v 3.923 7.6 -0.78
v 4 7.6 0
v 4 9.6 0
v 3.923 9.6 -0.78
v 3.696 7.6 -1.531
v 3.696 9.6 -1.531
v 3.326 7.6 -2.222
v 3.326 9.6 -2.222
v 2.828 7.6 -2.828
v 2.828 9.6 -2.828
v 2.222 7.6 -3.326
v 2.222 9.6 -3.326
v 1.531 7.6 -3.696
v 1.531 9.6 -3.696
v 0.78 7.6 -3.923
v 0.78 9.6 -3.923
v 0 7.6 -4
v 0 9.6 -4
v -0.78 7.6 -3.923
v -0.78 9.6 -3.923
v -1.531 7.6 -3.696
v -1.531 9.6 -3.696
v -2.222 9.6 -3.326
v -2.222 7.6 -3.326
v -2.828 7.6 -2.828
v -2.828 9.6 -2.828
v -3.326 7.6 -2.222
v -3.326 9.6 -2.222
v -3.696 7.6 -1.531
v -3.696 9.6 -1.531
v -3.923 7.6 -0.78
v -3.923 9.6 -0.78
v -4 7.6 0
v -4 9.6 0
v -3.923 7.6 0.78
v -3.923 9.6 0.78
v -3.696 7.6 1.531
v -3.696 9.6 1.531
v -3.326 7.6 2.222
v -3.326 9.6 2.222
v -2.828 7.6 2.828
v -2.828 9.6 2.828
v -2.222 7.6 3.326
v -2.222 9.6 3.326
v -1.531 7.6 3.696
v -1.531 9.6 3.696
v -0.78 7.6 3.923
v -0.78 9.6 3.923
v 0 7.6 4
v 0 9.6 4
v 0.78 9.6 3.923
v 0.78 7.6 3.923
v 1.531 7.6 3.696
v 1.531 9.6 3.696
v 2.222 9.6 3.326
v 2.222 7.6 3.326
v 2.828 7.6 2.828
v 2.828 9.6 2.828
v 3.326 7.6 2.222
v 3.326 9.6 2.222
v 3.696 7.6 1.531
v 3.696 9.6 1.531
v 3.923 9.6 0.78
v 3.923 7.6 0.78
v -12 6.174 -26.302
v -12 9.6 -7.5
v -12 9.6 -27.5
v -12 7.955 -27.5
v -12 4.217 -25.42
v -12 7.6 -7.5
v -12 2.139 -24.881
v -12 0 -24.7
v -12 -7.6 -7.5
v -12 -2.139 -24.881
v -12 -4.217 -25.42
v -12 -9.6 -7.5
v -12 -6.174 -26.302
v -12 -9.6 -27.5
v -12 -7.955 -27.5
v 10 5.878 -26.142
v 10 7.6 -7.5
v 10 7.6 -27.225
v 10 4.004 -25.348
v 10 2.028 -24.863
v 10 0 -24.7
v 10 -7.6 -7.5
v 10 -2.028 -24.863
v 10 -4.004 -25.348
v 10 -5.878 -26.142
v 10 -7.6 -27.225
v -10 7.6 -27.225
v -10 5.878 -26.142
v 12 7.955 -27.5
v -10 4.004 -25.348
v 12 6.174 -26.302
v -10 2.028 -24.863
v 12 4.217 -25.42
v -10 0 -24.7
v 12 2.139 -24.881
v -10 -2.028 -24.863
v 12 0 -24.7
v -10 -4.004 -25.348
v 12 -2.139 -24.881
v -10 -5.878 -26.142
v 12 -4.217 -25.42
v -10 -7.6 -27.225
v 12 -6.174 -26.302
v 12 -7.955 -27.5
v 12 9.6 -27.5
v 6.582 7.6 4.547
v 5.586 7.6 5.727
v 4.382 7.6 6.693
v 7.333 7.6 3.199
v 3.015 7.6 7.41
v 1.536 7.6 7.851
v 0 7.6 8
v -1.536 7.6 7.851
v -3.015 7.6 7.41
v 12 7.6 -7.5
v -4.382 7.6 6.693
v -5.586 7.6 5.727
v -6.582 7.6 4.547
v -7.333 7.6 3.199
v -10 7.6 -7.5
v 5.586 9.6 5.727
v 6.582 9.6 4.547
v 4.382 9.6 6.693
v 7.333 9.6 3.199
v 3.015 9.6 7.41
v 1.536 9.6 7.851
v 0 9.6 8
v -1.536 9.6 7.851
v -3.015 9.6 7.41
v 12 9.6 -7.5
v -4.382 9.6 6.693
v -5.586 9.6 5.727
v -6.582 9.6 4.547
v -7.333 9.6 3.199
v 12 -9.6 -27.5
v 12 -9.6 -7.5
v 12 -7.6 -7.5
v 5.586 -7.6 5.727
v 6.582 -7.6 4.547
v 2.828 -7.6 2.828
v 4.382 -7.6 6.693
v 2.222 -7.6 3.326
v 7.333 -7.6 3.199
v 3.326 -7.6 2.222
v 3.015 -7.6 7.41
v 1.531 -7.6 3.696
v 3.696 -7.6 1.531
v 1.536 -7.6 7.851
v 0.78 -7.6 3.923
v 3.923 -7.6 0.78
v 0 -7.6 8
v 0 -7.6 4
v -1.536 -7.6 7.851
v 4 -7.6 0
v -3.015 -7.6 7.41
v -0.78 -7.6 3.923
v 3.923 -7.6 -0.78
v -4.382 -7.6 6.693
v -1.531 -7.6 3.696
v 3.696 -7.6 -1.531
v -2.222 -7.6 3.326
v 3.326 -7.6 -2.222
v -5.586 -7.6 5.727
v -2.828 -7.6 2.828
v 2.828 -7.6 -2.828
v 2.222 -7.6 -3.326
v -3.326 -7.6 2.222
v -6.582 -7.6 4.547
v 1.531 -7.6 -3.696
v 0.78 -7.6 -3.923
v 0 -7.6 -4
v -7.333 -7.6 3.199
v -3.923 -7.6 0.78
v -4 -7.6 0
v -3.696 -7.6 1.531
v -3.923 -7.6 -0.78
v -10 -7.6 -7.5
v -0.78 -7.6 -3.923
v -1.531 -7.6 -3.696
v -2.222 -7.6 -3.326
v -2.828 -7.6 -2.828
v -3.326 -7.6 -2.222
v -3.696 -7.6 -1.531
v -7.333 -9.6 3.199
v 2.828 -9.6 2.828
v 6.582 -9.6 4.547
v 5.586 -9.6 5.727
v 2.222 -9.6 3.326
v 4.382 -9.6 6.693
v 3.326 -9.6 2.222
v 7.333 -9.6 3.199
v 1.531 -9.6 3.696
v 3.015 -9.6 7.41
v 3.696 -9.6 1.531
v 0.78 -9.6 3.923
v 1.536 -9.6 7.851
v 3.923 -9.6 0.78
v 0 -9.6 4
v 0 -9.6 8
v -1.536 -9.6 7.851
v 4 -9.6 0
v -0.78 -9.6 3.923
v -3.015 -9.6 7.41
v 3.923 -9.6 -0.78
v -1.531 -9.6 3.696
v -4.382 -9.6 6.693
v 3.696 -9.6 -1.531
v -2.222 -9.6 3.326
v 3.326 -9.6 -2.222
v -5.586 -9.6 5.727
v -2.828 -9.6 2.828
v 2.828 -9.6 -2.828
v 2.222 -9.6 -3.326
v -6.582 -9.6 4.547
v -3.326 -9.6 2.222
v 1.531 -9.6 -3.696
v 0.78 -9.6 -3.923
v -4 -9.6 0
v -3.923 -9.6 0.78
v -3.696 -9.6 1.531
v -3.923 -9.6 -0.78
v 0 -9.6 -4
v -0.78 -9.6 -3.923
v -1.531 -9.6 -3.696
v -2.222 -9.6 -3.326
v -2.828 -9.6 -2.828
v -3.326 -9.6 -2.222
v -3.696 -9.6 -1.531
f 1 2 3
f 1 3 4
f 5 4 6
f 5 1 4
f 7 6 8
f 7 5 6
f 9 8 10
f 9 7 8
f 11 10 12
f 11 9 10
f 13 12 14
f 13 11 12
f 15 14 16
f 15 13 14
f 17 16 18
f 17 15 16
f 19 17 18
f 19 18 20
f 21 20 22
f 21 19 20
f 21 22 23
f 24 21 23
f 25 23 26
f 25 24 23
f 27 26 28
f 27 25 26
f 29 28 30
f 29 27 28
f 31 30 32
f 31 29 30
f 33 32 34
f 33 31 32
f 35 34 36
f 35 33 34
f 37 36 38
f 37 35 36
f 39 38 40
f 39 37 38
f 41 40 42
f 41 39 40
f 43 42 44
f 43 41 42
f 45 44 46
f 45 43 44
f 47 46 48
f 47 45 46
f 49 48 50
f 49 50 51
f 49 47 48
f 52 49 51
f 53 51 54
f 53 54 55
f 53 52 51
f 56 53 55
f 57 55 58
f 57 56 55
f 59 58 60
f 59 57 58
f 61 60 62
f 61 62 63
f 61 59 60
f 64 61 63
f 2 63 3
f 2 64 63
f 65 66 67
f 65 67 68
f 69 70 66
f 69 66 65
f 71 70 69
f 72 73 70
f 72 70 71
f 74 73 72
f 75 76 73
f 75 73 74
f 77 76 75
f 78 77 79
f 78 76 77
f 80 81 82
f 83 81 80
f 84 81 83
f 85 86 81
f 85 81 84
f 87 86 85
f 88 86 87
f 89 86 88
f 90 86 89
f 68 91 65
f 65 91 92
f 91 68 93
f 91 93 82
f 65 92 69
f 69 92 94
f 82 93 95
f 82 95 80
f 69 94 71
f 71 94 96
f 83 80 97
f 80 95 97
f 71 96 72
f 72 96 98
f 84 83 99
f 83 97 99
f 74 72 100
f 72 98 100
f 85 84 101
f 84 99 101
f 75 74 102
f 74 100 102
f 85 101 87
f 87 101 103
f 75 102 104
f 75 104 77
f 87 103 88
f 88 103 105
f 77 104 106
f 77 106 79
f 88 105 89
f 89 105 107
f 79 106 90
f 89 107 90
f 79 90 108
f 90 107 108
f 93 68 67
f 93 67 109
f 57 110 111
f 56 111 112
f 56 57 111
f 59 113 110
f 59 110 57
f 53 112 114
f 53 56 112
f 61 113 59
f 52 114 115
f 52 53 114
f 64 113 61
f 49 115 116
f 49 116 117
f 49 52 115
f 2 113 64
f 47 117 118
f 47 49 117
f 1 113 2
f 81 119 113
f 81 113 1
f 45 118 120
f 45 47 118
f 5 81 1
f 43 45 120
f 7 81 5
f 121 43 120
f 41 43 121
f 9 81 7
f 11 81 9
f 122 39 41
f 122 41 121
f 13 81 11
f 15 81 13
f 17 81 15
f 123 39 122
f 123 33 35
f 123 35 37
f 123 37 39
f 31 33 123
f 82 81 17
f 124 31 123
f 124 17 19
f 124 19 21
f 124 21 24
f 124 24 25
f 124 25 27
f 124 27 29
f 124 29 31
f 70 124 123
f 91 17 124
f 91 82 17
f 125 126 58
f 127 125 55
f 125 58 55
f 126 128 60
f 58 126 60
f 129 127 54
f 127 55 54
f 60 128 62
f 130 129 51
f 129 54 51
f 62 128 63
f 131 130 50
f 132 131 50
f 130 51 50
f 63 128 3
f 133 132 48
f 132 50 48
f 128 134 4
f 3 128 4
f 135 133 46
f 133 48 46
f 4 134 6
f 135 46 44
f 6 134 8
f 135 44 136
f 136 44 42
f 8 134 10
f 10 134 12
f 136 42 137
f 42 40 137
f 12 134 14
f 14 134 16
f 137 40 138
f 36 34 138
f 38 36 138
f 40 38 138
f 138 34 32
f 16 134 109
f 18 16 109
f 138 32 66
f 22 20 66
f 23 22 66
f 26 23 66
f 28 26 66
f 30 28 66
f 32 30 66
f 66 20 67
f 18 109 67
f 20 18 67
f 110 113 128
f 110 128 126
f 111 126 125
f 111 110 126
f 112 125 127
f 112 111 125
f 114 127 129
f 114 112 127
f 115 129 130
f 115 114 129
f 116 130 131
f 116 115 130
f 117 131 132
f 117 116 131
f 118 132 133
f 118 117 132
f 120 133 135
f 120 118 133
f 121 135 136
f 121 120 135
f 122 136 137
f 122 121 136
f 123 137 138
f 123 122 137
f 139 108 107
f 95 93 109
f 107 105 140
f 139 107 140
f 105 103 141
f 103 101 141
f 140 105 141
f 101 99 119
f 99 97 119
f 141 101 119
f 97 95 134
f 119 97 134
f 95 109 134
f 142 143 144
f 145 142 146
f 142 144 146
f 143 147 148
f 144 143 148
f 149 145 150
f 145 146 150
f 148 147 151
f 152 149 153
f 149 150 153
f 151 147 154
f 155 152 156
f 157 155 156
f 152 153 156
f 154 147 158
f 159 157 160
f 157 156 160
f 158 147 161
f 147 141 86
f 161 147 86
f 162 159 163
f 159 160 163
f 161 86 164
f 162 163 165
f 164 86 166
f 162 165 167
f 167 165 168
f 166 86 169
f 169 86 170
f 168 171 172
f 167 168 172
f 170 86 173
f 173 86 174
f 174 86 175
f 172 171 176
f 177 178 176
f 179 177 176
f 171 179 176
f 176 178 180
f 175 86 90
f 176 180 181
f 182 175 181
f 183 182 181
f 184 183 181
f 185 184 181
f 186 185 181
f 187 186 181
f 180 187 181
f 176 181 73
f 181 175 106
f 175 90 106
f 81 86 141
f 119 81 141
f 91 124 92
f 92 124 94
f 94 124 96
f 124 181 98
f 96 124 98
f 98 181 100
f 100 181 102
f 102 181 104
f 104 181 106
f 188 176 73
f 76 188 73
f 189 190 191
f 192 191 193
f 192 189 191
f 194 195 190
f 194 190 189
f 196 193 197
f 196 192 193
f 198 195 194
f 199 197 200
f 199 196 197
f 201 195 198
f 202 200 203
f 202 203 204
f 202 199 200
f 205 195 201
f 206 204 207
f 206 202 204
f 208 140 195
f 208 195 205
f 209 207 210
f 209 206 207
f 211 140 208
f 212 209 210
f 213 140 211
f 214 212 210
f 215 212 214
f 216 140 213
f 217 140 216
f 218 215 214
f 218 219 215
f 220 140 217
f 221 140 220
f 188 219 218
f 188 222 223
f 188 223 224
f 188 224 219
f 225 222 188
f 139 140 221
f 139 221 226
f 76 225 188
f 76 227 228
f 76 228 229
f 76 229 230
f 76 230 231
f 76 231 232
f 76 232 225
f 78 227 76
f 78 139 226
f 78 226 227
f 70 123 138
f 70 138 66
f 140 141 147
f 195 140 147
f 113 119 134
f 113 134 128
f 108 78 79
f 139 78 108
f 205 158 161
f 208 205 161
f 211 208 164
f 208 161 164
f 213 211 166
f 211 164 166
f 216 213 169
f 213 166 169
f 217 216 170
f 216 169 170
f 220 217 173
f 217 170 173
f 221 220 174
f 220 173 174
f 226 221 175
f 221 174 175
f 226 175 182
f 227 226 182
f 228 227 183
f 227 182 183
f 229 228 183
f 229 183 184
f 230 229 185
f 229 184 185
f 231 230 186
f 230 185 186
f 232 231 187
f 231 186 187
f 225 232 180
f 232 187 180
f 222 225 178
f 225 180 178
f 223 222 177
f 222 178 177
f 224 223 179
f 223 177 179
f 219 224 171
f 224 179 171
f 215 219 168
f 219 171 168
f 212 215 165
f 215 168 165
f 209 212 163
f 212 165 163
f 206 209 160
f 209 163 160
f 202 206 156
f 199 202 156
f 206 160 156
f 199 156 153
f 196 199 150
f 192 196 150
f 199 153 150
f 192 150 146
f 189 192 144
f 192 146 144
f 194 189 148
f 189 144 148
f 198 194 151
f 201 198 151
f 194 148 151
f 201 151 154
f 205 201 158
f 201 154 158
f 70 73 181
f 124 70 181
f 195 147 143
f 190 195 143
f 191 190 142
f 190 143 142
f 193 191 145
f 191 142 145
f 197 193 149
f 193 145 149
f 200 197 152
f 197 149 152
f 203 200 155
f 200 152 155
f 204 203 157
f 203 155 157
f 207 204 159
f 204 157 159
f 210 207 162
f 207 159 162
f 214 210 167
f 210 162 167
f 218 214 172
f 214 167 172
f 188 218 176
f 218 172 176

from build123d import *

# Parameters (mm, degrees)
BOSS_EXTRUDE1_START     = 7.6
SKETCH1_R               = 4
BOSS_EXTRUDE1_DEPTH     = 2
BOSS_EXTRUDE2_START     = -7.6
SKETCH1_2_R             = 4
BOSS_EXTRUDE2_DEPTH     = 2
BOSS_EXTRUDE3_START     = -7.6
SKETCH2_W               = 2
SKETCH2_H               = 20
BOSS_EXTRUDE3_DEPTH     = 15.2
SKETCH3_R               = 12.7
CUT_EXTRUDE1_DEPTH      = 13
CUT_EXTRUDE1_DEPTH_BACK = 13


with BuildPart() as part:
    # Sketch1 → Boss-Extrude1 (new body)
    with BuildSketch(Plane(origin=(0, 0, 0), x_dir=(1, 0, 0), z_dir=(0, 1, 0)).offset(BOSS_EXTRUDE1_START)):
        with BuildLine():
            Line((7.06, 27.5), (12, 27.5))
            Line((12, 27.5), (12, 7.5))
            Line((12, 7.5), (7.332619485, -3.198857842))
            ThreePointArc((7.332619485, -3.198857842), (0, -8), (-7.332619485, -3.198857842))
            Line((-7.332619485, -3.198857842), (-12, 7.5))
            Line((-12, 7.5), (-12, 22.888900714))
            Line((-12, 22.888900714), (-12, 27.5))
            Line((-12, 27.5), (7.06, 27.5))
        make_face()
        Circle(SKETCH1_R, mode=Mode.SUBTRACT)
    extrude(amount=BOSS_EXTRUDE1_DEPTH)



with BuildPart() as body_2:
    # Sketch1<2> → Boss-Extrude2 (new body)
    with BuildSketch(Plane(origin=(0, 0, 0), x_dir=(1, 0, 0), z_dir=(0, 1, 0)).offset(BOSS_EXTRUDE2_START)):
        with BuildLine():
            Line((7.06, 27.5), (12, 27.5))
            Line((12, 27.5), (12, 7.5))
            Line((12, 7.5), (7.332619485, -3.198857842))
            ThreePointArc((7.332619485, -3.198857842), (0, -8), (-7.332619485, -3.198857842))
            Line((-7.332619485, -3.198857842), (-12, 7.5))
            Line((-12, 7.5), (-12, 22.888900714))
            Line((-12, 22.888900714), (-12, 27.5))
            Line((-12, 27.5), (7.06, 27.5))
        make_face()
        Circle(SKETCH1_2_R, mode=Mode.SUBTRACT)
    extrude(amount=-BOSS_EXTRUDE2_DEPTH)


with BuildPart() as part_1:
    add(part.part)

    add(body_2.part)  # Boss-Extrude3 merges body 2
    # Sketch2 → Boss-Extrude3 (add)
    with BuildSketch(Plane(origin=(0, 0, 0), x_dir=(1, 0, 0), z_dir=(0, 1, 0)).offset(BOSS_EXTRUDE3_START)):
        with Locations((-11, 17.5)):
            Rectangle(SKETCH2_W, SKETCH2_H)
        with Locations((11, 17.5)):
            Rectangle(SKETCH2_W, SKETCH2_H)
    extrude(amount=BOSS_EXTRUDE3_DEPTH)

    # Sketch3 → Cut-Extrude1 (cut, two sides)
    with BuildSketch(Plane(origin=(0, 0, 0), x_dir=(0, 0, -1), z_dir=(1, 0, 0))) as cut_extrude1_sk:
        with Locations((37.4, 0)):
            Circle(SKETCH3_R)
    extrude(amount=CUT_EXTRUDE1_DEPTH, mode=Mode.SUBTRACT)
    extrude(cut_extrude1_sk.sketch, amount=-CUT_EXTRUDE1_DEPTH_BACK, mode=Mode.SUBTRACT)


solid = part_1.part
